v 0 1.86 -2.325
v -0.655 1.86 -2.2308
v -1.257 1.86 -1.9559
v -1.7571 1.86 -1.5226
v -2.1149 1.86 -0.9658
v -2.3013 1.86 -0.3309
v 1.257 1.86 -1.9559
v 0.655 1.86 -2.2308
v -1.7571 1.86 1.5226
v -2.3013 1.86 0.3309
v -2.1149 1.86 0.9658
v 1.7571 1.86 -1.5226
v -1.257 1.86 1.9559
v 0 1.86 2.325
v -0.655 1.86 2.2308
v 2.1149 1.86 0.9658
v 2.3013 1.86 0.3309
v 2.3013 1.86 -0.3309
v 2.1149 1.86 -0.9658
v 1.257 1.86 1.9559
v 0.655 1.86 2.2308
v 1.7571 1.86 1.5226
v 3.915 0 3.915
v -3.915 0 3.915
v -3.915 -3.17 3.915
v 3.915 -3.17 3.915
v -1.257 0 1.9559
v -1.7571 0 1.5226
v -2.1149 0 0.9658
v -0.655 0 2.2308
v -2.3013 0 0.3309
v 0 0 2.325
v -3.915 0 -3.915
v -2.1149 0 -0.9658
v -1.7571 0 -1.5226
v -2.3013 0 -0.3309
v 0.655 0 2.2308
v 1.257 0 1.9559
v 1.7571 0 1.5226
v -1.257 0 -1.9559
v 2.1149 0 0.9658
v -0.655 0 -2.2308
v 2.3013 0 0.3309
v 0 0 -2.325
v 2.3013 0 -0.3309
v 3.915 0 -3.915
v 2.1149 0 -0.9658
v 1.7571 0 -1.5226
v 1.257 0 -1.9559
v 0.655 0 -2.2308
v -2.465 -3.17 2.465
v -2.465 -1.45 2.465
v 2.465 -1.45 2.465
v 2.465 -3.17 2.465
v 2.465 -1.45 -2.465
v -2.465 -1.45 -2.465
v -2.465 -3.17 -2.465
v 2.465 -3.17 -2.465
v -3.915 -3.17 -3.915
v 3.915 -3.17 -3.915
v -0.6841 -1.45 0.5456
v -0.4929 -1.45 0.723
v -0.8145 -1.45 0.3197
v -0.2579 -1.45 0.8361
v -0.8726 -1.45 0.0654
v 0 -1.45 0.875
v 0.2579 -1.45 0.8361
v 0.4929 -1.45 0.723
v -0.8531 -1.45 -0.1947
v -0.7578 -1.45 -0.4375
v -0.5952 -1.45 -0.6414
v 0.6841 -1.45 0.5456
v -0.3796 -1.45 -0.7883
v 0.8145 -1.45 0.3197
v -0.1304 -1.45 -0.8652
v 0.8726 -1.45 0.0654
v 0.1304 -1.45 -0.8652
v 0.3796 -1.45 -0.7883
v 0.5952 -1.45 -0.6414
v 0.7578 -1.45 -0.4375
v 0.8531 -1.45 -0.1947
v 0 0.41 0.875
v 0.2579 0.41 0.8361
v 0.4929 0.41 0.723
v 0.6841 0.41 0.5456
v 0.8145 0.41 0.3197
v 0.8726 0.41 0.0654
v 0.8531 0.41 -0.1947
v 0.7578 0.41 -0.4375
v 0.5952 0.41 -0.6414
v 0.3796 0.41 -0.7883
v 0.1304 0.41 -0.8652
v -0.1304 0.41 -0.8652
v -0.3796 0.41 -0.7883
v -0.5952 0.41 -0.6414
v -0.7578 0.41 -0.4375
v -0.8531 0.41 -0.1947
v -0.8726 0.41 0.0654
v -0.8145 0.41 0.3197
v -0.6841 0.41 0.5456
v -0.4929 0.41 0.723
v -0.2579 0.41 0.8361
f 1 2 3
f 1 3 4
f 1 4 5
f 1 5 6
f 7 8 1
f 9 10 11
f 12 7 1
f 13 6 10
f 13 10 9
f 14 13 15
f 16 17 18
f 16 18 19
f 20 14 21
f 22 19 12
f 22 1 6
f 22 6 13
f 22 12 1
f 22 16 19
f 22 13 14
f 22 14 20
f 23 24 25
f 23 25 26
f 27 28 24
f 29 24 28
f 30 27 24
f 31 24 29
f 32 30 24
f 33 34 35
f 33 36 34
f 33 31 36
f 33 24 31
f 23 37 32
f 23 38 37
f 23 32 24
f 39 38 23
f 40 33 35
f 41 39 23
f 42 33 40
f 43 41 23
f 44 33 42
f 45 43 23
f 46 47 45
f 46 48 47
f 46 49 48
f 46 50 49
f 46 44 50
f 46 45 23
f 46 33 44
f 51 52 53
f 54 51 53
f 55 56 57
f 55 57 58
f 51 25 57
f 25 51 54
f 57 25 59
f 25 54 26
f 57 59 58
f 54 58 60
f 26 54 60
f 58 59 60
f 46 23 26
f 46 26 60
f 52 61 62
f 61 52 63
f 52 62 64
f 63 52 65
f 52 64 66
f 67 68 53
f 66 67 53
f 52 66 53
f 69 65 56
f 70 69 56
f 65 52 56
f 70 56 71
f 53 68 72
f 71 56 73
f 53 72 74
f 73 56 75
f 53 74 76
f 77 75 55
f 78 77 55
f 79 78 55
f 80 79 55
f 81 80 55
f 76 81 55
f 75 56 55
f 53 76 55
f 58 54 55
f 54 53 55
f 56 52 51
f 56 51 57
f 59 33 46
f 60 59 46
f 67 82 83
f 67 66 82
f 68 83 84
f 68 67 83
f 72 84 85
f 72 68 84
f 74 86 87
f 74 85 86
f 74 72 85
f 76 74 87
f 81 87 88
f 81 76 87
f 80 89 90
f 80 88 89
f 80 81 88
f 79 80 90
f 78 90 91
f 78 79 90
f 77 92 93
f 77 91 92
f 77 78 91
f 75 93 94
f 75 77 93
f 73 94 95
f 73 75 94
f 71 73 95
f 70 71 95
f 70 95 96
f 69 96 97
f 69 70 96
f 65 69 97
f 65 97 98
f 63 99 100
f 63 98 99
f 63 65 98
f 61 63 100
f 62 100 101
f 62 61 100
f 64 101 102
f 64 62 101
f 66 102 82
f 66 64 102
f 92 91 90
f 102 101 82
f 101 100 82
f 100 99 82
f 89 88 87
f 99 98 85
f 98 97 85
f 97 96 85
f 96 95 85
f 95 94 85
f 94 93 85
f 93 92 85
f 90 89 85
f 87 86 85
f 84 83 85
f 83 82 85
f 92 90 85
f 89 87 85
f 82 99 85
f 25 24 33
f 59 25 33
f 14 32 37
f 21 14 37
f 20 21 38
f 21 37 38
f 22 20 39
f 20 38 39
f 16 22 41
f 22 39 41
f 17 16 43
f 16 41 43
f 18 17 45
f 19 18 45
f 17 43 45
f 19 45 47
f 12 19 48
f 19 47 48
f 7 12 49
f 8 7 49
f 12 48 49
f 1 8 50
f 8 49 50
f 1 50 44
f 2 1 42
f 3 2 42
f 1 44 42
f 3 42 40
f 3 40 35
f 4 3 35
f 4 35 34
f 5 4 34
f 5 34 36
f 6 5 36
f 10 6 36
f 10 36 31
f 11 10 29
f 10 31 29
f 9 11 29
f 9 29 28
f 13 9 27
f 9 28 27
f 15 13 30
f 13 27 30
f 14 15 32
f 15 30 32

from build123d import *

# Parameters (mm, degrees)
SKETCH1_W           = 7.83
SKETCH1_H           = 7.83
BOSS_EXTRUDE1_DEPTH = 3.17
SKETCH2_R           = 2.325
BOSS_EXTRUDE2_DEPTH = 1.86
SHELL2_T            = -1.45


with BuildPart() as part:
    # Sketch1 → Boss-Extrude1 (new body)
    with BuildSketch(Plane(origin=(0, 0, 0), x_dir=(1, 0, 0), z_dir=(0, 1, 0))):
        Rectangle(SKETCH1_W, SKETCH1_H)
    extrude(amount=-BOSS_EXTRUDE1_DEPTH)

    # Sketch2 → Boss-Extrude2 (add)
    with BuildSketch(Plane(origin=(0, 0, 0), x_dir=(1, 0, 0), z_dir=(0, 1, 0))):
        with Locations(Location((0, 0, 0), (0, 0, 270))):
            Circle(SKETCH2_R)
    extrude(amount=BOSS_EXTRUDE2_DEPTH)

    # Shell2
    shell2_openings = [part.faces().sort_by_distance(p)[0] for p in [
        (0, -3.17, 0),
    ]]
    offset(amount=SHELL2_T, openings=shell2_openings, kind=Kind.INTERSECTION)


solid = part.part
